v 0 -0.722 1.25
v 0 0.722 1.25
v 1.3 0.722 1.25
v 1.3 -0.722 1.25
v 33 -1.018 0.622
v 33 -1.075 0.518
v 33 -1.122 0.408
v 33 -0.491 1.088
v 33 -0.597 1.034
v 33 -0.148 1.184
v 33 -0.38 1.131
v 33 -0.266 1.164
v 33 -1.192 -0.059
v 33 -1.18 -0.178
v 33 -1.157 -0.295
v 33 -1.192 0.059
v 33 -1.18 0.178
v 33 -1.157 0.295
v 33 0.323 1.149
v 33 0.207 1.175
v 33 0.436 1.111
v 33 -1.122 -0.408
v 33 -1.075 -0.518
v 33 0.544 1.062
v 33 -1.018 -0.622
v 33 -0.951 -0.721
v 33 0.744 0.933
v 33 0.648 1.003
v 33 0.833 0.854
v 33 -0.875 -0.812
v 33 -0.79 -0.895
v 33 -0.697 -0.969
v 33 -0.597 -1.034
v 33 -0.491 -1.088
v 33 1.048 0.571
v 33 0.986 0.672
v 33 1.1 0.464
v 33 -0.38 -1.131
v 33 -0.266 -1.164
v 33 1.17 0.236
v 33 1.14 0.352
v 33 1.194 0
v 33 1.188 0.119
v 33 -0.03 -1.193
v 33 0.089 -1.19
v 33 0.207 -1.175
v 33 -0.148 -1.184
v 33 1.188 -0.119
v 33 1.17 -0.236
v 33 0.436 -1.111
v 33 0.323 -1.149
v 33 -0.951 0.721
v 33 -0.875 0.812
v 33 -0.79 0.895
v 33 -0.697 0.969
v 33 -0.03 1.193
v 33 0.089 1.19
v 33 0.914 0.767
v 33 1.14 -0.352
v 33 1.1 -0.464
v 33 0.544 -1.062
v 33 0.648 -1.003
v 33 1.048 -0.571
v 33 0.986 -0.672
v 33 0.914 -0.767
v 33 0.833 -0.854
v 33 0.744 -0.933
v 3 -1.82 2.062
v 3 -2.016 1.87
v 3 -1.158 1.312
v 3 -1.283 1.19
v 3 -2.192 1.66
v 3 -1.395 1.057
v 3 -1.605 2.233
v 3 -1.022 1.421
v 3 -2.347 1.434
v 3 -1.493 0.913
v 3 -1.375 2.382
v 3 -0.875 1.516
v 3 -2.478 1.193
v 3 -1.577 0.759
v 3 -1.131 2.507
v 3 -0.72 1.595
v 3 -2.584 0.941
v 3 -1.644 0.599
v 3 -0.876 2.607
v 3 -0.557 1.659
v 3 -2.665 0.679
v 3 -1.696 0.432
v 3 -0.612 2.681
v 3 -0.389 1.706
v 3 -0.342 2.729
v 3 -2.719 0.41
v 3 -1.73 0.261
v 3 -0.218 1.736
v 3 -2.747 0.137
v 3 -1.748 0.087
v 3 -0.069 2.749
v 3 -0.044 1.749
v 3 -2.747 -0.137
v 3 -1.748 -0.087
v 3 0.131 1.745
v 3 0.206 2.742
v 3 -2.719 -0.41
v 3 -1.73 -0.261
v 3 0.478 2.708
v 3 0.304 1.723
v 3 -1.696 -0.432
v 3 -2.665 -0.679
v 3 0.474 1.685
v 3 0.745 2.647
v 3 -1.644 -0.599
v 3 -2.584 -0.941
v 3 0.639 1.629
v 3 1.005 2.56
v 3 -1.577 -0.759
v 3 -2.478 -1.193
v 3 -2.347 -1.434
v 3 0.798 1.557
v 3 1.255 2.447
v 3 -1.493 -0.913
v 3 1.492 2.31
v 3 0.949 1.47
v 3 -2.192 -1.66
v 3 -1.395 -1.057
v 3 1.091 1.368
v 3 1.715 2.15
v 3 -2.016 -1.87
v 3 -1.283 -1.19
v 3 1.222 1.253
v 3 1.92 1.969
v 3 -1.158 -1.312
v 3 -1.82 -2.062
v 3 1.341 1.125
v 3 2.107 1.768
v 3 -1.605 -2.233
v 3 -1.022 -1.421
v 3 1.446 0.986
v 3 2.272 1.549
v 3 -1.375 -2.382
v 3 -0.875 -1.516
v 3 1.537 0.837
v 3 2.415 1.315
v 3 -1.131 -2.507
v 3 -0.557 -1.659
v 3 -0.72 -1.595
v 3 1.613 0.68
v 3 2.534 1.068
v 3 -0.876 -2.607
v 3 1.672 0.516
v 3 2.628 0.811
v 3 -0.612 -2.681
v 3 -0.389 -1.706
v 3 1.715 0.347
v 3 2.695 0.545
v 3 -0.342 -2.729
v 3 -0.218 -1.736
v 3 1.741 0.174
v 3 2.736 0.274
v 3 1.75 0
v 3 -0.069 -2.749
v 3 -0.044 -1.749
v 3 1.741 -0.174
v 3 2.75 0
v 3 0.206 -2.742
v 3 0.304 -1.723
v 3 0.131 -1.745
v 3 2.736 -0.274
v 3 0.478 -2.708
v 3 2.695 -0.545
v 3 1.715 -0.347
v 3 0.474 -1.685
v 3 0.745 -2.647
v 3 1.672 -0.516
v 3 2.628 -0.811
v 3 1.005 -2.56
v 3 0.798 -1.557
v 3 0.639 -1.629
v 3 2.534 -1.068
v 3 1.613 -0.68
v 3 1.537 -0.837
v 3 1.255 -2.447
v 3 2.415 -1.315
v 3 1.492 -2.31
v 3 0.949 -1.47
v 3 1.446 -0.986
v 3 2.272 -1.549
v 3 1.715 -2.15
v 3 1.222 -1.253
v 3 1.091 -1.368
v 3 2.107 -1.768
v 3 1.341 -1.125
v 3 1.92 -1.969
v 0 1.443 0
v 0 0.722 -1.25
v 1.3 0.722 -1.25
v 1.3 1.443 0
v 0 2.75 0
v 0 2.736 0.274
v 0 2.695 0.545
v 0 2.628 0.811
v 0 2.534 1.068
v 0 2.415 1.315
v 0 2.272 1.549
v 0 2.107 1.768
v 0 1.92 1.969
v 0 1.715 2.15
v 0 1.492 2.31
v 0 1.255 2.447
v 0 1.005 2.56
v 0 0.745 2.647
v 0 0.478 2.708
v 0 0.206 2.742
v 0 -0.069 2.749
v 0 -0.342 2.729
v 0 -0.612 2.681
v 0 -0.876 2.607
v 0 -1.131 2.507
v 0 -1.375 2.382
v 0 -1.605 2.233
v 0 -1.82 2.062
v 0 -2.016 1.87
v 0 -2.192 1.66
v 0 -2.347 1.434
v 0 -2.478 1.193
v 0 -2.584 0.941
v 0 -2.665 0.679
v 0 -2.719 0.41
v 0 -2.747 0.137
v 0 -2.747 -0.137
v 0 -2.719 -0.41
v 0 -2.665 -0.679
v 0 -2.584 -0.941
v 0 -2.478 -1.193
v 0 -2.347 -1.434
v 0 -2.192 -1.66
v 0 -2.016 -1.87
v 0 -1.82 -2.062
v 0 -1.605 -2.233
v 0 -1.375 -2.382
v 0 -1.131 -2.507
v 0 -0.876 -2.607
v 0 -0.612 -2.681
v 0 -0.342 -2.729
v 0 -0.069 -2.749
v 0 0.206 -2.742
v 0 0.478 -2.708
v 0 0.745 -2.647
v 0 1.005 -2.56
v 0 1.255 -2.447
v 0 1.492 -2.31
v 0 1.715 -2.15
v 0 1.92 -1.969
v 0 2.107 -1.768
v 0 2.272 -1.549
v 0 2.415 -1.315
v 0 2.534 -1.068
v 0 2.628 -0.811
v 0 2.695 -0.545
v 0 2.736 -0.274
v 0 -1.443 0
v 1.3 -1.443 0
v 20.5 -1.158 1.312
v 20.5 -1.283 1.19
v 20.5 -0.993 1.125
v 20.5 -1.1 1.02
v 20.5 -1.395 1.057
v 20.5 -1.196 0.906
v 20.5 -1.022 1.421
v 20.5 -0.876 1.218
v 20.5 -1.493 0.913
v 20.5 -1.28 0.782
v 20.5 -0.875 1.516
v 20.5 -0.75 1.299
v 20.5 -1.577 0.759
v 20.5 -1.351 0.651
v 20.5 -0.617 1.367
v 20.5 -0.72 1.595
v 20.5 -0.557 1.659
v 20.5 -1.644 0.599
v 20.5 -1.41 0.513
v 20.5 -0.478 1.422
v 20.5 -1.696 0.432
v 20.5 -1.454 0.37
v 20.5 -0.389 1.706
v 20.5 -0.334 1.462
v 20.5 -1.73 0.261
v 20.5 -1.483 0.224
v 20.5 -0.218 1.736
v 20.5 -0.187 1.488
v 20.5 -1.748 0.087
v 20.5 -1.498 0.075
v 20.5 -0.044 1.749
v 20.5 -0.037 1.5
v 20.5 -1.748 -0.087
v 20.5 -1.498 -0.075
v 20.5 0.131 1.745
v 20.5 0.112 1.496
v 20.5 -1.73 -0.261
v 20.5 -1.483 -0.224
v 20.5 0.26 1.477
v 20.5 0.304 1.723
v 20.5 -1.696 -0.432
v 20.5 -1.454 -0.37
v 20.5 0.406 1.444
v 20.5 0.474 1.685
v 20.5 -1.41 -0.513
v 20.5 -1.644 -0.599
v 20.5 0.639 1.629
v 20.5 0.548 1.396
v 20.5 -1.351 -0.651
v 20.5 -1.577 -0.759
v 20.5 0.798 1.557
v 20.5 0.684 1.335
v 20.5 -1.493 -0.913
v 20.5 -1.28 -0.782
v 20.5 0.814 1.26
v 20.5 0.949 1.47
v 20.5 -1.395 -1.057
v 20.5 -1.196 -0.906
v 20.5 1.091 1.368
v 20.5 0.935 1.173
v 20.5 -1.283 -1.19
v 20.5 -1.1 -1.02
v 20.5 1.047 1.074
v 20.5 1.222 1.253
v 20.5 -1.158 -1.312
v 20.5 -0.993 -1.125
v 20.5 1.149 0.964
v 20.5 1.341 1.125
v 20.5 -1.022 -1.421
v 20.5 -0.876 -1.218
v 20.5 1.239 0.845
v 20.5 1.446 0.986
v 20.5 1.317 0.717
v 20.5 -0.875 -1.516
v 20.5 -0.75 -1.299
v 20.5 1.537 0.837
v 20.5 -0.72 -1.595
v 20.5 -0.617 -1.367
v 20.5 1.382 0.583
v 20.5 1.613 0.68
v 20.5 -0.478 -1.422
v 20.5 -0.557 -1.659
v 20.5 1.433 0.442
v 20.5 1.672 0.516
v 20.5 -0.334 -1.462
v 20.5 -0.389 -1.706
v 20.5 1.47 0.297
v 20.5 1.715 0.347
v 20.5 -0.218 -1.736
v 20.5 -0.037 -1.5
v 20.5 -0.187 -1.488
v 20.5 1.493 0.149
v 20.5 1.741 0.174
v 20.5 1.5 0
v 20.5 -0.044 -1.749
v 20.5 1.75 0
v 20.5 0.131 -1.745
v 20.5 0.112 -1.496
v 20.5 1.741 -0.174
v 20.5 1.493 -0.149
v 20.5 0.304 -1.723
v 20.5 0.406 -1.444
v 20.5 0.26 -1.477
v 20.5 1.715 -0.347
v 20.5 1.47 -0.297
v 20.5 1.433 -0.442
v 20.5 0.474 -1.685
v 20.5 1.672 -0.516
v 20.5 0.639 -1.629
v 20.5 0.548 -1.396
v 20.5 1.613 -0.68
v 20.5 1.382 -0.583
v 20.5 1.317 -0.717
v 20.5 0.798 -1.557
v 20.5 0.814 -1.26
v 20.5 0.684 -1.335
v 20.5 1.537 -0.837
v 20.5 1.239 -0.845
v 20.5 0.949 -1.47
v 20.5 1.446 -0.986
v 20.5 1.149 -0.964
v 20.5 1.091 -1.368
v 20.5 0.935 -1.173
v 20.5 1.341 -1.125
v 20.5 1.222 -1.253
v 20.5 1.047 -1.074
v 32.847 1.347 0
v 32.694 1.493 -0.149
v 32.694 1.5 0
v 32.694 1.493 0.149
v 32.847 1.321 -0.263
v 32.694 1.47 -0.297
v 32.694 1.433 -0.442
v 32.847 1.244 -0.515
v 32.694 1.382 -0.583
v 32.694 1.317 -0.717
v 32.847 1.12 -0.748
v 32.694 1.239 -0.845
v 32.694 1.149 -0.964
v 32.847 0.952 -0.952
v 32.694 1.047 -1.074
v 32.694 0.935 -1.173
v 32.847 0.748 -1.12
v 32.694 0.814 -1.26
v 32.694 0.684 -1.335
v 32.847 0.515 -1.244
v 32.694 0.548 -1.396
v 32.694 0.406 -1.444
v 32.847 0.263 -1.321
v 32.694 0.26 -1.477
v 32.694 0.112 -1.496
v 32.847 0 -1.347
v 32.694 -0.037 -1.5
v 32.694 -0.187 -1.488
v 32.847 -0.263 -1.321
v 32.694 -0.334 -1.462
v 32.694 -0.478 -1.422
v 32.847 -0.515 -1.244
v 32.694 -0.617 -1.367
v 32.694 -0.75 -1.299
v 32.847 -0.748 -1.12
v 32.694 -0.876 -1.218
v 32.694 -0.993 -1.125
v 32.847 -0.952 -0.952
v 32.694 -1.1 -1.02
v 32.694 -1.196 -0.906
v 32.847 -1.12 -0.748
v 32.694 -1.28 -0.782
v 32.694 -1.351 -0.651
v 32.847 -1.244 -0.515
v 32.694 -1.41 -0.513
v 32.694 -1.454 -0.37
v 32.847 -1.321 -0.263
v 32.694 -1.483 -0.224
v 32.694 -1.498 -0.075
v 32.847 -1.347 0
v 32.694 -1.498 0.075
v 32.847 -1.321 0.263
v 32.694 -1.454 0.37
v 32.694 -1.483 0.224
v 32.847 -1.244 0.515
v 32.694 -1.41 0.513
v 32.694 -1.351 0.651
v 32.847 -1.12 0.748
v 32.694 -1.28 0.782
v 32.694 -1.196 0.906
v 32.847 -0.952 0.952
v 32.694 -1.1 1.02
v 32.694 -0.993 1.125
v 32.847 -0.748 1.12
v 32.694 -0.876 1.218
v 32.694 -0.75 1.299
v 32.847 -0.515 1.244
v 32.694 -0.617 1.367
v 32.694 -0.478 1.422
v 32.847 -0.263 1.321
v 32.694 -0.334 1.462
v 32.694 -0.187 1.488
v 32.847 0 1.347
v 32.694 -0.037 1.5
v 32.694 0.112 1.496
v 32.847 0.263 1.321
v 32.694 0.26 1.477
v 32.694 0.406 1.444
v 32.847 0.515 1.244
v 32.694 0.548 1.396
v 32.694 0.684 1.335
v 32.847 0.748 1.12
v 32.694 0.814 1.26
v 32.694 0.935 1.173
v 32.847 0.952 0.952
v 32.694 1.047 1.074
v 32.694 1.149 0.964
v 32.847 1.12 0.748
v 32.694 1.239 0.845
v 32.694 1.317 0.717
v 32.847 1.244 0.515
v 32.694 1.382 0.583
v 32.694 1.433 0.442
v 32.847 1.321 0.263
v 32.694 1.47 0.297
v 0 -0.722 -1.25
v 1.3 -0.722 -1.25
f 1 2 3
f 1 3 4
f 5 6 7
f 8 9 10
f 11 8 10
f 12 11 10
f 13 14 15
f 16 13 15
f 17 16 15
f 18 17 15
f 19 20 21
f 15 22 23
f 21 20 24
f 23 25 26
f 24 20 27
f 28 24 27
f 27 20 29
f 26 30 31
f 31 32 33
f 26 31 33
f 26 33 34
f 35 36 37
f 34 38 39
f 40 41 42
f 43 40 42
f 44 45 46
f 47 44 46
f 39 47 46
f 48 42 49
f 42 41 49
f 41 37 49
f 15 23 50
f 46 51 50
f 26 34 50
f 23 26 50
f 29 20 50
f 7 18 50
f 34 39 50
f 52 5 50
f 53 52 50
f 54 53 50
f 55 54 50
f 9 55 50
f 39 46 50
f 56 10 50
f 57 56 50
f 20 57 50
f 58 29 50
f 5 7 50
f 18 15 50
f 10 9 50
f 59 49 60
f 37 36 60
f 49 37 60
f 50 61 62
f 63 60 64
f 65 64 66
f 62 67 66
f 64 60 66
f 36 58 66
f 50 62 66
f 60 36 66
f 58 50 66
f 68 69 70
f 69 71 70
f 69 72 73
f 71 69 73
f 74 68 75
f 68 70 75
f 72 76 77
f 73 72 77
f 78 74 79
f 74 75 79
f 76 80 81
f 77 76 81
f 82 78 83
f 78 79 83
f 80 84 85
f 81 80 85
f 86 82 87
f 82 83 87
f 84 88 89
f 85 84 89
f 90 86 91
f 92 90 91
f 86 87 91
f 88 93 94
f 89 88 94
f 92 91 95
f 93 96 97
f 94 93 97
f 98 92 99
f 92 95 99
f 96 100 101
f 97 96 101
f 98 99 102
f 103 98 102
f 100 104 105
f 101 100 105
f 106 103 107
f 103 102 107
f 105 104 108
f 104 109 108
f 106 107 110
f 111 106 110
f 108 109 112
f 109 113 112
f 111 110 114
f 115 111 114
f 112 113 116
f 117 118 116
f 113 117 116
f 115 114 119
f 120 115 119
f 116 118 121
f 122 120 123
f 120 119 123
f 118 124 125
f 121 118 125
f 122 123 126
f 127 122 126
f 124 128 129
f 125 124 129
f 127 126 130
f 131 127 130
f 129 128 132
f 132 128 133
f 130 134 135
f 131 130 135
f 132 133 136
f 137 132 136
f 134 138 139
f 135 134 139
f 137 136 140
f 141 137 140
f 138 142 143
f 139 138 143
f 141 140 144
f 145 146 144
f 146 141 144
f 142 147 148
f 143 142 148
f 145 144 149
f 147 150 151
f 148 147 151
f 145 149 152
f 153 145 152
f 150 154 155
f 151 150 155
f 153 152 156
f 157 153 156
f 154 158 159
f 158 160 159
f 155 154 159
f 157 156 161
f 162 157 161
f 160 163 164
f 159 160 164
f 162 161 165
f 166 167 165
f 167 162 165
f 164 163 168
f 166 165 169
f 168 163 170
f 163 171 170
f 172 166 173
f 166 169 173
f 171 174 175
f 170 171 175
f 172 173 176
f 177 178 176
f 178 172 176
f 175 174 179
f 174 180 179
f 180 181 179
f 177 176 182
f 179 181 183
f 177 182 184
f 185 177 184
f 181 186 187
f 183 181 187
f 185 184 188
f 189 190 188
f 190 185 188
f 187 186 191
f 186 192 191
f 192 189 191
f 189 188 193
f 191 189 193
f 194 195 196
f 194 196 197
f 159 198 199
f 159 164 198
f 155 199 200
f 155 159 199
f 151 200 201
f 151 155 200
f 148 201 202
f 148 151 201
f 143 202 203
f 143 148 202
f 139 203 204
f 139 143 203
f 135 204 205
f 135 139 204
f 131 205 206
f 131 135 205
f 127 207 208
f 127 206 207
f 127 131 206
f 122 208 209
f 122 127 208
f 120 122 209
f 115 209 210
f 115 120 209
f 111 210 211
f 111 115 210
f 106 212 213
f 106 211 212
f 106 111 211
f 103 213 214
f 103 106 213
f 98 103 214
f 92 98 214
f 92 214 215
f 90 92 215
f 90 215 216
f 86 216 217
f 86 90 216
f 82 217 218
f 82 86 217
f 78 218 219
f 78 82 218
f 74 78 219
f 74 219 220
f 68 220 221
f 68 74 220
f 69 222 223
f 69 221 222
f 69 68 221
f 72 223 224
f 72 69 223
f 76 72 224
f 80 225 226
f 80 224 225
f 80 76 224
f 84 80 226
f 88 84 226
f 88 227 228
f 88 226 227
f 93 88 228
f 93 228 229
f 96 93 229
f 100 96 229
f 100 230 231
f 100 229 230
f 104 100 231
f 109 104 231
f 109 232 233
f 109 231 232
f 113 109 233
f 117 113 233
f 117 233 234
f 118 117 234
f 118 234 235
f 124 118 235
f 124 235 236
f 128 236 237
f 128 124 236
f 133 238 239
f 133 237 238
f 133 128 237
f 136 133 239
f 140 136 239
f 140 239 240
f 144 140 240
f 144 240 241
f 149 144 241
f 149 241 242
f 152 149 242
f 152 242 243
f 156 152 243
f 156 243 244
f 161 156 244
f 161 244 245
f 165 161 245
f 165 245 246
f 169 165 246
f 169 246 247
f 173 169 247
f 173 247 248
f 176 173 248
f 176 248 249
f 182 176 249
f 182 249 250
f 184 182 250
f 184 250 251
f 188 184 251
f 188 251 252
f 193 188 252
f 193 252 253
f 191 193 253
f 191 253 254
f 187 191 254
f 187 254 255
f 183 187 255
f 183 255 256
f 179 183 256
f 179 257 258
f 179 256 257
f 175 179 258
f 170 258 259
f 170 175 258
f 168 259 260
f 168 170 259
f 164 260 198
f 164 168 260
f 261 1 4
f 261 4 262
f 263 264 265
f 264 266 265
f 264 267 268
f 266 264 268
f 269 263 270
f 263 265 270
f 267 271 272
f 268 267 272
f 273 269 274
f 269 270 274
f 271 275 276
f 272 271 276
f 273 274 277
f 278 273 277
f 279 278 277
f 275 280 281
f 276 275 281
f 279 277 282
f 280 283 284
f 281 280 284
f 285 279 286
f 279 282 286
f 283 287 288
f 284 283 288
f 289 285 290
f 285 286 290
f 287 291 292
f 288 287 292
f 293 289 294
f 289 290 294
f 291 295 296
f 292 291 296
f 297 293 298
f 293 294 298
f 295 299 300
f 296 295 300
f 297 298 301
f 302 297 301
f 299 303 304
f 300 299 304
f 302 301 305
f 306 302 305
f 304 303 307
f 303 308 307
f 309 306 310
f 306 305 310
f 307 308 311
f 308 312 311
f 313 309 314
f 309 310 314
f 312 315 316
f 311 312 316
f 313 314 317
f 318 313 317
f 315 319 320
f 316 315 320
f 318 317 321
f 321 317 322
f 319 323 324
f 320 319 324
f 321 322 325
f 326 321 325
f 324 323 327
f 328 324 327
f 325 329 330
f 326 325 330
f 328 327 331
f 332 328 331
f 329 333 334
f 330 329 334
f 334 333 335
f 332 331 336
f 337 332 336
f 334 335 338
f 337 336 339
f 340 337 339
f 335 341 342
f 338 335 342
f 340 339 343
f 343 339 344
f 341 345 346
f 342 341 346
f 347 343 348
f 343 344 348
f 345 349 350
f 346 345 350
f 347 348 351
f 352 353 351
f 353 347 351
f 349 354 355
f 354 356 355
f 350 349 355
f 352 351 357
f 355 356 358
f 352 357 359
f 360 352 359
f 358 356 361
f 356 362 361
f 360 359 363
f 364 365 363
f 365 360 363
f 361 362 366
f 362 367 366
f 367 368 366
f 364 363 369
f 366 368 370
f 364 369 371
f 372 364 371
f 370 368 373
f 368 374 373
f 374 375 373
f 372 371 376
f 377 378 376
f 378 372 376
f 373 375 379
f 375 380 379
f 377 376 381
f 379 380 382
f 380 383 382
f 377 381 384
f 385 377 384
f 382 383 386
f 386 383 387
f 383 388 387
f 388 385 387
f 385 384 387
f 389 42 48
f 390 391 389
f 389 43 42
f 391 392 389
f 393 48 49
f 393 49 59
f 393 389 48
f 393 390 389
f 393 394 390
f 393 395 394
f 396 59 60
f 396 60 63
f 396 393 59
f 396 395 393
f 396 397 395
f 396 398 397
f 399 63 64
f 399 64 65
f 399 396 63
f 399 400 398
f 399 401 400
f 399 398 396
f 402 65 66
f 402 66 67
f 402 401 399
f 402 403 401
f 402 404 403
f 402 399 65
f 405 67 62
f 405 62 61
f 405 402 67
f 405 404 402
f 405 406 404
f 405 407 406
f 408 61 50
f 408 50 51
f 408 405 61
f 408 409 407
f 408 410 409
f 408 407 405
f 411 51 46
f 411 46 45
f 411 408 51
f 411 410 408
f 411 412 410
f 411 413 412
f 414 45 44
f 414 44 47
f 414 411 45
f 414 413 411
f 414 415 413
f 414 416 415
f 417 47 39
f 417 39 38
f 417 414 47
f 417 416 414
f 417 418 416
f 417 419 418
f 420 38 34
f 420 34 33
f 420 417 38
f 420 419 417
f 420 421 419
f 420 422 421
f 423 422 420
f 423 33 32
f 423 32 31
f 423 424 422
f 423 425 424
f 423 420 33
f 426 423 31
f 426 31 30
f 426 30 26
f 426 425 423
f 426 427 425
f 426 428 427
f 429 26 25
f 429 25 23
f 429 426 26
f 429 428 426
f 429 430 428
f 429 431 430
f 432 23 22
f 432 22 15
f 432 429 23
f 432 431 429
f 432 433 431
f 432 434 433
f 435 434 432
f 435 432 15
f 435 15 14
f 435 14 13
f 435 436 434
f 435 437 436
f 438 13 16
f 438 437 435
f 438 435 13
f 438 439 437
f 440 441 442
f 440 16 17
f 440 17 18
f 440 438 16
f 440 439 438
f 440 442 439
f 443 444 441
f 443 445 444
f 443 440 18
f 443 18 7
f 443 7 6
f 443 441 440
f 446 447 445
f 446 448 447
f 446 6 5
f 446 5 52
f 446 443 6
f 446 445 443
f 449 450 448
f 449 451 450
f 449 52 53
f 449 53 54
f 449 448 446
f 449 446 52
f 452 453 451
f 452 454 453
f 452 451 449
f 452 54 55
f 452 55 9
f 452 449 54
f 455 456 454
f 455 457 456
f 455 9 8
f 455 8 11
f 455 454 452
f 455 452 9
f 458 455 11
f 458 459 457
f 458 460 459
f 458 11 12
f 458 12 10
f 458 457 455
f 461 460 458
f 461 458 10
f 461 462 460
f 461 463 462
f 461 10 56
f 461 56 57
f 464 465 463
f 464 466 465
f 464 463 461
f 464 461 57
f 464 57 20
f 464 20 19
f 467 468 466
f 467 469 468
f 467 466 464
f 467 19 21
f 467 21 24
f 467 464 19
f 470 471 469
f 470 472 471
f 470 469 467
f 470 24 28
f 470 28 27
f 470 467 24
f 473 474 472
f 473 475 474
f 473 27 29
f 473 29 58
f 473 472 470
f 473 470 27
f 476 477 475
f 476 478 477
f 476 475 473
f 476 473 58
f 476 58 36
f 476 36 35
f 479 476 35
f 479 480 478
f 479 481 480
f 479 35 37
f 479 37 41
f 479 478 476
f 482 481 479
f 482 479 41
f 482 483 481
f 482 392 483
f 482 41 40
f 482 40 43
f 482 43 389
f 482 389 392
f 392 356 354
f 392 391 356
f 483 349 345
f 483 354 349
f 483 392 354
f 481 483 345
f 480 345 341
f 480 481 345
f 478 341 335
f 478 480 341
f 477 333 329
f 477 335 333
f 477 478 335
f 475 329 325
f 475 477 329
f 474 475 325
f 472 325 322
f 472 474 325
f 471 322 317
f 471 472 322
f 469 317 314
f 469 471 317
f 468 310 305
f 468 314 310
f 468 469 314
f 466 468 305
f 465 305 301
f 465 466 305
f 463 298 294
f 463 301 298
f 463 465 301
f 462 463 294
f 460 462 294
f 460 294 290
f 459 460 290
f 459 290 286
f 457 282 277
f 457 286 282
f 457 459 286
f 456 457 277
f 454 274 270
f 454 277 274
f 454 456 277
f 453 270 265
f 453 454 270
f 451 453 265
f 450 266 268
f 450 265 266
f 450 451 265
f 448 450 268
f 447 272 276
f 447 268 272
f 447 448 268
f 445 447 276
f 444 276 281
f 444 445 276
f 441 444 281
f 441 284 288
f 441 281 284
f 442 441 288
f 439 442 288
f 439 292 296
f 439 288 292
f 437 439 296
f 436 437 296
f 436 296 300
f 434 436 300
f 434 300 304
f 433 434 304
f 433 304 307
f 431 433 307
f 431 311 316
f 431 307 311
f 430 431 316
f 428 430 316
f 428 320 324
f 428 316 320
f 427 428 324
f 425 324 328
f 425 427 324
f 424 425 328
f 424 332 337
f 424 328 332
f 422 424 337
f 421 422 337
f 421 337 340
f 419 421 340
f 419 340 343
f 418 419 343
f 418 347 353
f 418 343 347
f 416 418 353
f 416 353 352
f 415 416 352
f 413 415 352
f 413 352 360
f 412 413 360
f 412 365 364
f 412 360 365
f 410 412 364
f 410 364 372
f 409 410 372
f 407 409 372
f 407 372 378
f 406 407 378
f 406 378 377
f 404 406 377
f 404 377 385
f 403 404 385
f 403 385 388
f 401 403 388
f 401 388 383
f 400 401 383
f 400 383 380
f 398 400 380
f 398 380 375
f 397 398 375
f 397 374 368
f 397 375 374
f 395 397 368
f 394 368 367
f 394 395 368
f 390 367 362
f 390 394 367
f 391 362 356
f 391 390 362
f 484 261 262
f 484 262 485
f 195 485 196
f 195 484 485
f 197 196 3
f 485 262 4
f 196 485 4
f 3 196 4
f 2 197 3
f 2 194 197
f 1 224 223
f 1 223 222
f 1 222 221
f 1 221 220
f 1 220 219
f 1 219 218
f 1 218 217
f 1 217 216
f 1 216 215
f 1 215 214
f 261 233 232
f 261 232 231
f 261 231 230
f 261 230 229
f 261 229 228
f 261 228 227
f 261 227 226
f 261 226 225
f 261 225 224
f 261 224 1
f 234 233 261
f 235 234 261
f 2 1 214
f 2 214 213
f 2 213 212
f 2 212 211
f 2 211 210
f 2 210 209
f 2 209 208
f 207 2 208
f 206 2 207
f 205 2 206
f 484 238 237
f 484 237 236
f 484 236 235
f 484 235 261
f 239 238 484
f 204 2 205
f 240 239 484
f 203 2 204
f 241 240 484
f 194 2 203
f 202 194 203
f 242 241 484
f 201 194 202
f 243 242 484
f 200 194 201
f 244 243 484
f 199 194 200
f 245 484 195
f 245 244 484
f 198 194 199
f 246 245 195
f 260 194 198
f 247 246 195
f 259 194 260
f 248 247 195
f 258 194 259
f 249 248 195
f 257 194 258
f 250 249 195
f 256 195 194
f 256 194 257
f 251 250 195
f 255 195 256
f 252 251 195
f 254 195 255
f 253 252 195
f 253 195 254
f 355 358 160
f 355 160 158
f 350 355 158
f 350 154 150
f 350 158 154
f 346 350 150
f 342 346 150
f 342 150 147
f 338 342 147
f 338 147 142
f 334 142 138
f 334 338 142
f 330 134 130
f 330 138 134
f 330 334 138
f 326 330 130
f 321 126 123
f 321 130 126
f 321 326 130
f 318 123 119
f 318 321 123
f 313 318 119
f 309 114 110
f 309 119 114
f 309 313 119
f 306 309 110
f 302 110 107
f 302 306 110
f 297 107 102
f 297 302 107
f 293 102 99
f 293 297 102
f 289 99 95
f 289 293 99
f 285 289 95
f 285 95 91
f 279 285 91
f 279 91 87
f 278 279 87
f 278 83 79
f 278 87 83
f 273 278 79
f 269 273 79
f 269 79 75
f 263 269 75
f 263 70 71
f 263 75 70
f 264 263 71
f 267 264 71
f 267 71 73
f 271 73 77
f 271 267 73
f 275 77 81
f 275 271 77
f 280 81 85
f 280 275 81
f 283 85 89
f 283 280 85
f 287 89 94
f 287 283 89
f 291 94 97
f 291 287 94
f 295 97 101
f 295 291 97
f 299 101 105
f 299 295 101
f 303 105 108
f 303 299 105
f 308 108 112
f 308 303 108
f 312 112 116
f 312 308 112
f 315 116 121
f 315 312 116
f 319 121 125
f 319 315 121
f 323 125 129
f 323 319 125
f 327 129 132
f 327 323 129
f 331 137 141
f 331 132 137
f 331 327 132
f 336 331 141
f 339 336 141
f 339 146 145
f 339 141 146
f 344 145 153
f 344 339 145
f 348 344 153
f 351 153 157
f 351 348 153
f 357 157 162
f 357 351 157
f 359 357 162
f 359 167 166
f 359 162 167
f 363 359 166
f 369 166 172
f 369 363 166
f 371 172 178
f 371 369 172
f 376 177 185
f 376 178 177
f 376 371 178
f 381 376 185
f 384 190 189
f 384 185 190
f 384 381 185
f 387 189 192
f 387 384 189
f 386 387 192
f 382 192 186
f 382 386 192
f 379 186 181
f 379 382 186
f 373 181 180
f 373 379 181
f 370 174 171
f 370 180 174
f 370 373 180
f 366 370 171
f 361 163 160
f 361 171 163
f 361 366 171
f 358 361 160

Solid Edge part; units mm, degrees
sketch "Sketch1" plane through (0, 0, 0) normal (0, 0, 1) x (1, 0, 0)
  line L0 (0, 0) -> (0, 2.75)
  line L1 (0, 2.75) -> (3, 2.75)
  line L2 (3, 2.75) -> (3, 1.75)
  line L3 (3, 1.75) -> (20.5, 1.75)
  line L4 (20.5, 1.75) -> (20.5, 1.5)
  line L5 (20.5, 1.5) -> (32.6935, 1.5)
  line L6 (32.6935, 1.5) -> (33, 1.1935)
  line L7 (33, 1.1935) -> (33, 0)
  line L8 (33, 0) -> (0, 0)
revolve "RevolvedProtrusion1" add sketch "Sketch1" angle 360 about axis through (33, 0, 0) along (-1, 0, 0)
cosmetic_thread "Thread1" size "M3"
sketch "Sketch2" plane through (0, 0, 0) normal (1, 0, 0) x (0, 1, 0)
  line L0 (-0.7217, 1.25) -> (-1.4434, 0)
  line L1 (-1.4434, 0) -> (-0.7217, -1.25)
  line L2 (-0.7217, -1.25) -> (0.7217, -1.25)
  line L3 (0.7217, -1.25) -> (1.4434, 0)
  line L4 (1.4434, 0) -> (0.7217, 1.25)
  line L5 (0.7217, 1.25) -> (-0.7217, 1.25)
extrude "ExtrudedCutout_1" cut sketch "Sketch2" along normal blind 1.3
properties part number "CDQS12_CQ-M3x30L"
